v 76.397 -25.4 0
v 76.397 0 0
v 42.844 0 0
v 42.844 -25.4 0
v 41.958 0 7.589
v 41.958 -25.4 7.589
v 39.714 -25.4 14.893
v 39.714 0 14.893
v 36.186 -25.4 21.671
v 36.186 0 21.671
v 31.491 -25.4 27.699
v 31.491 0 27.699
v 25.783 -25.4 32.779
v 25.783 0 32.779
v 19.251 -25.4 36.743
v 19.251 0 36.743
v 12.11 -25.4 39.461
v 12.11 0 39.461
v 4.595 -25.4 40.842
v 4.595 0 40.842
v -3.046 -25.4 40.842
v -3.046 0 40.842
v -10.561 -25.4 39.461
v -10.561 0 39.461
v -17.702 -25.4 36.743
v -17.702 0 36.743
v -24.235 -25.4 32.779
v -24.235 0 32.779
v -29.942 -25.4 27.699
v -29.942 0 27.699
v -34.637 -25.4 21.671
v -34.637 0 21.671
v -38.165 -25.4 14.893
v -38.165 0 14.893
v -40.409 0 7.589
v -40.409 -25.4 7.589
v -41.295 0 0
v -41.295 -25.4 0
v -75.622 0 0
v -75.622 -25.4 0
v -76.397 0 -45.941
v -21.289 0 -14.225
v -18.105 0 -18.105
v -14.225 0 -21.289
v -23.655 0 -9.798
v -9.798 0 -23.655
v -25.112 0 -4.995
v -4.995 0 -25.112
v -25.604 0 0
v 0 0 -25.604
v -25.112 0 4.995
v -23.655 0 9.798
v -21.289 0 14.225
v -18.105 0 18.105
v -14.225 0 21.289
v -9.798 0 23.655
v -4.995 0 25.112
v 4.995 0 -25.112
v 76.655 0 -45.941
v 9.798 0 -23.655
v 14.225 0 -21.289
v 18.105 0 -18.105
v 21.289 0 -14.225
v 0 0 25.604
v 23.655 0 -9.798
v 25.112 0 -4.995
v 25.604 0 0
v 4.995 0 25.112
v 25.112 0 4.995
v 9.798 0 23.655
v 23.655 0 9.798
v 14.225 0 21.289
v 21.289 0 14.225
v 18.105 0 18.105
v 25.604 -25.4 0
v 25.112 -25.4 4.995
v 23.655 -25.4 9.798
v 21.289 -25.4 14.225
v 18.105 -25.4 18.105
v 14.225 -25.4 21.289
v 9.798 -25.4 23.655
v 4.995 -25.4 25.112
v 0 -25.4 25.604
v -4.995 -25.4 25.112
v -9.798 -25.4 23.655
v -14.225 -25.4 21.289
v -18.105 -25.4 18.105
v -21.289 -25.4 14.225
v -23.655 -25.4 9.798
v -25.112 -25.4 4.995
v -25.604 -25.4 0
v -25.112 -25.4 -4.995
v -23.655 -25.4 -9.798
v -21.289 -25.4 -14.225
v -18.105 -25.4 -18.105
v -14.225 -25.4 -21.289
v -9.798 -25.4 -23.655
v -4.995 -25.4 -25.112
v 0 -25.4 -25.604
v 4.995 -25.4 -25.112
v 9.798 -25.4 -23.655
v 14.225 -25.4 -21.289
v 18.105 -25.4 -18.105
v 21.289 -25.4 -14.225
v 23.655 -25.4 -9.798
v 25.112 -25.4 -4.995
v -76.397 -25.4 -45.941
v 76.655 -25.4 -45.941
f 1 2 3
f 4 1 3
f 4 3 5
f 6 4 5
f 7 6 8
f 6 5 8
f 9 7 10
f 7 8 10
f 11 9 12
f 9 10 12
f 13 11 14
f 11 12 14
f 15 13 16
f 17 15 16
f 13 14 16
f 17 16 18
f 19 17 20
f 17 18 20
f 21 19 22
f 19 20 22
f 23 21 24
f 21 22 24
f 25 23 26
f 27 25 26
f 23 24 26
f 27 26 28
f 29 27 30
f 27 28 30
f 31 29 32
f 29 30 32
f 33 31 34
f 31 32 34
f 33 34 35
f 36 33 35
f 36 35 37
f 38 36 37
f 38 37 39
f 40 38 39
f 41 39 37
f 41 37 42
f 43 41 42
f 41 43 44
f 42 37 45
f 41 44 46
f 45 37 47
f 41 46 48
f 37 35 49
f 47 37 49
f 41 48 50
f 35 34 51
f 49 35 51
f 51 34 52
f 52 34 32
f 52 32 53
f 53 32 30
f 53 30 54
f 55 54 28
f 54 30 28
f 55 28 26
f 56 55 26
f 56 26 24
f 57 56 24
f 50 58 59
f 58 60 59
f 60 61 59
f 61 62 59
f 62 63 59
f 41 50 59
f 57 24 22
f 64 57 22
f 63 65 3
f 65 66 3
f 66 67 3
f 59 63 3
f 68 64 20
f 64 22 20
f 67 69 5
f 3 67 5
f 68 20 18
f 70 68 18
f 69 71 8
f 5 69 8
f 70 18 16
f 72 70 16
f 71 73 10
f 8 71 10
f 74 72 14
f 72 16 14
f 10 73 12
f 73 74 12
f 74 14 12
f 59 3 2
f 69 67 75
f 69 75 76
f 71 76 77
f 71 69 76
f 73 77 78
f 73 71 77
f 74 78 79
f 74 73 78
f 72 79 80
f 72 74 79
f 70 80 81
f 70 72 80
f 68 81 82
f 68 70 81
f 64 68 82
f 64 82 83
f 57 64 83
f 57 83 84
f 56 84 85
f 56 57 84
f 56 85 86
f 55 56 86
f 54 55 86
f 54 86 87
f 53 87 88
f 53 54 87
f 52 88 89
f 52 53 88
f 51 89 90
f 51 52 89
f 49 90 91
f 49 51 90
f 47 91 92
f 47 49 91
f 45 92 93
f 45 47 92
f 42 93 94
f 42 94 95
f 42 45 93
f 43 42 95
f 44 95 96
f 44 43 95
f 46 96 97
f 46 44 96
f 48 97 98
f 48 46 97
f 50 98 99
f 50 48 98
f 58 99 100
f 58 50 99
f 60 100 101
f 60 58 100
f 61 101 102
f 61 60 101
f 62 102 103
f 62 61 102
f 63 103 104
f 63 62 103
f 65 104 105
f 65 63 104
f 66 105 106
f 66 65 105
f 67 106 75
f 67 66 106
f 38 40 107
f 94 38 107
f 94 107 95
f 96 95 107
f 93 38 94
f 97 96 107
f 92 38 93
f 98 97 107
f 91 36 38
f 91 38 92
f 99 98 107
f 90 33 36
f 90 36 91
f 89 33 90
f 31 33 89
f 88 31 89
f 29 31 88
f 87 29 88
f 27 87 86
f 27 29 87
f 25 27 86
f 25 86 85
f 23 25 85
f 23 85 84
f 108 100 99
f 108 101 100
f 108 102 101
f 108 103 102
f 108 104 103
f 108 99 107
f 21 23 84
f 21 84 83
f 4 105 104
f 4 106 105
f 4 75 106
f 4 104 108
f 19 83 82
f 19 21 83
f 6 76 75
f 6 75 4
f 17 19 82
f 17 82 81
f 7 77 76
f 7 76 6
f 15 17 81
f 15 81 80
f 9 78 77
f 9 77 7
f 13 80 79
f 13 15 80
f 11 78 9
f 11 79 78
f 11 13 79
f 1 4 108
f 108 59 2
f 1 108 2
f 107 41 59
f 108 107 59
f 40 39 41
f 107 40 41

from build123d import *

# Parameters (mm, degrees)
F0_R     = 25.603668
F1_DEPTH = 25.4


with BuildPart() as f1:
    # F0 (on Front) → F1 (new body)
    with BuildSketch(Plane.XZ):
        with BuildLine():
            Line((-75.622357, 0), (-76.396644, -45.941226))
            Line((-76.396644, -45.941226), (76.65474, -45.941226))
            Line((76.65474, -45.941226), (76.396652, 0))
            Line((76.396652, 0), (42.844061, 0))
            ThreePointArc((42.844061, 0), (0.774289, 41.016271), (-41.295484, 0))
            Line((-41.295484, 0), (-75.622357, 0))
        make_face()
        Circle(F0_R, mode=Mode.SUBTRACT)
    extrude(amount=F1_DEPTH)


solid = f1.part
